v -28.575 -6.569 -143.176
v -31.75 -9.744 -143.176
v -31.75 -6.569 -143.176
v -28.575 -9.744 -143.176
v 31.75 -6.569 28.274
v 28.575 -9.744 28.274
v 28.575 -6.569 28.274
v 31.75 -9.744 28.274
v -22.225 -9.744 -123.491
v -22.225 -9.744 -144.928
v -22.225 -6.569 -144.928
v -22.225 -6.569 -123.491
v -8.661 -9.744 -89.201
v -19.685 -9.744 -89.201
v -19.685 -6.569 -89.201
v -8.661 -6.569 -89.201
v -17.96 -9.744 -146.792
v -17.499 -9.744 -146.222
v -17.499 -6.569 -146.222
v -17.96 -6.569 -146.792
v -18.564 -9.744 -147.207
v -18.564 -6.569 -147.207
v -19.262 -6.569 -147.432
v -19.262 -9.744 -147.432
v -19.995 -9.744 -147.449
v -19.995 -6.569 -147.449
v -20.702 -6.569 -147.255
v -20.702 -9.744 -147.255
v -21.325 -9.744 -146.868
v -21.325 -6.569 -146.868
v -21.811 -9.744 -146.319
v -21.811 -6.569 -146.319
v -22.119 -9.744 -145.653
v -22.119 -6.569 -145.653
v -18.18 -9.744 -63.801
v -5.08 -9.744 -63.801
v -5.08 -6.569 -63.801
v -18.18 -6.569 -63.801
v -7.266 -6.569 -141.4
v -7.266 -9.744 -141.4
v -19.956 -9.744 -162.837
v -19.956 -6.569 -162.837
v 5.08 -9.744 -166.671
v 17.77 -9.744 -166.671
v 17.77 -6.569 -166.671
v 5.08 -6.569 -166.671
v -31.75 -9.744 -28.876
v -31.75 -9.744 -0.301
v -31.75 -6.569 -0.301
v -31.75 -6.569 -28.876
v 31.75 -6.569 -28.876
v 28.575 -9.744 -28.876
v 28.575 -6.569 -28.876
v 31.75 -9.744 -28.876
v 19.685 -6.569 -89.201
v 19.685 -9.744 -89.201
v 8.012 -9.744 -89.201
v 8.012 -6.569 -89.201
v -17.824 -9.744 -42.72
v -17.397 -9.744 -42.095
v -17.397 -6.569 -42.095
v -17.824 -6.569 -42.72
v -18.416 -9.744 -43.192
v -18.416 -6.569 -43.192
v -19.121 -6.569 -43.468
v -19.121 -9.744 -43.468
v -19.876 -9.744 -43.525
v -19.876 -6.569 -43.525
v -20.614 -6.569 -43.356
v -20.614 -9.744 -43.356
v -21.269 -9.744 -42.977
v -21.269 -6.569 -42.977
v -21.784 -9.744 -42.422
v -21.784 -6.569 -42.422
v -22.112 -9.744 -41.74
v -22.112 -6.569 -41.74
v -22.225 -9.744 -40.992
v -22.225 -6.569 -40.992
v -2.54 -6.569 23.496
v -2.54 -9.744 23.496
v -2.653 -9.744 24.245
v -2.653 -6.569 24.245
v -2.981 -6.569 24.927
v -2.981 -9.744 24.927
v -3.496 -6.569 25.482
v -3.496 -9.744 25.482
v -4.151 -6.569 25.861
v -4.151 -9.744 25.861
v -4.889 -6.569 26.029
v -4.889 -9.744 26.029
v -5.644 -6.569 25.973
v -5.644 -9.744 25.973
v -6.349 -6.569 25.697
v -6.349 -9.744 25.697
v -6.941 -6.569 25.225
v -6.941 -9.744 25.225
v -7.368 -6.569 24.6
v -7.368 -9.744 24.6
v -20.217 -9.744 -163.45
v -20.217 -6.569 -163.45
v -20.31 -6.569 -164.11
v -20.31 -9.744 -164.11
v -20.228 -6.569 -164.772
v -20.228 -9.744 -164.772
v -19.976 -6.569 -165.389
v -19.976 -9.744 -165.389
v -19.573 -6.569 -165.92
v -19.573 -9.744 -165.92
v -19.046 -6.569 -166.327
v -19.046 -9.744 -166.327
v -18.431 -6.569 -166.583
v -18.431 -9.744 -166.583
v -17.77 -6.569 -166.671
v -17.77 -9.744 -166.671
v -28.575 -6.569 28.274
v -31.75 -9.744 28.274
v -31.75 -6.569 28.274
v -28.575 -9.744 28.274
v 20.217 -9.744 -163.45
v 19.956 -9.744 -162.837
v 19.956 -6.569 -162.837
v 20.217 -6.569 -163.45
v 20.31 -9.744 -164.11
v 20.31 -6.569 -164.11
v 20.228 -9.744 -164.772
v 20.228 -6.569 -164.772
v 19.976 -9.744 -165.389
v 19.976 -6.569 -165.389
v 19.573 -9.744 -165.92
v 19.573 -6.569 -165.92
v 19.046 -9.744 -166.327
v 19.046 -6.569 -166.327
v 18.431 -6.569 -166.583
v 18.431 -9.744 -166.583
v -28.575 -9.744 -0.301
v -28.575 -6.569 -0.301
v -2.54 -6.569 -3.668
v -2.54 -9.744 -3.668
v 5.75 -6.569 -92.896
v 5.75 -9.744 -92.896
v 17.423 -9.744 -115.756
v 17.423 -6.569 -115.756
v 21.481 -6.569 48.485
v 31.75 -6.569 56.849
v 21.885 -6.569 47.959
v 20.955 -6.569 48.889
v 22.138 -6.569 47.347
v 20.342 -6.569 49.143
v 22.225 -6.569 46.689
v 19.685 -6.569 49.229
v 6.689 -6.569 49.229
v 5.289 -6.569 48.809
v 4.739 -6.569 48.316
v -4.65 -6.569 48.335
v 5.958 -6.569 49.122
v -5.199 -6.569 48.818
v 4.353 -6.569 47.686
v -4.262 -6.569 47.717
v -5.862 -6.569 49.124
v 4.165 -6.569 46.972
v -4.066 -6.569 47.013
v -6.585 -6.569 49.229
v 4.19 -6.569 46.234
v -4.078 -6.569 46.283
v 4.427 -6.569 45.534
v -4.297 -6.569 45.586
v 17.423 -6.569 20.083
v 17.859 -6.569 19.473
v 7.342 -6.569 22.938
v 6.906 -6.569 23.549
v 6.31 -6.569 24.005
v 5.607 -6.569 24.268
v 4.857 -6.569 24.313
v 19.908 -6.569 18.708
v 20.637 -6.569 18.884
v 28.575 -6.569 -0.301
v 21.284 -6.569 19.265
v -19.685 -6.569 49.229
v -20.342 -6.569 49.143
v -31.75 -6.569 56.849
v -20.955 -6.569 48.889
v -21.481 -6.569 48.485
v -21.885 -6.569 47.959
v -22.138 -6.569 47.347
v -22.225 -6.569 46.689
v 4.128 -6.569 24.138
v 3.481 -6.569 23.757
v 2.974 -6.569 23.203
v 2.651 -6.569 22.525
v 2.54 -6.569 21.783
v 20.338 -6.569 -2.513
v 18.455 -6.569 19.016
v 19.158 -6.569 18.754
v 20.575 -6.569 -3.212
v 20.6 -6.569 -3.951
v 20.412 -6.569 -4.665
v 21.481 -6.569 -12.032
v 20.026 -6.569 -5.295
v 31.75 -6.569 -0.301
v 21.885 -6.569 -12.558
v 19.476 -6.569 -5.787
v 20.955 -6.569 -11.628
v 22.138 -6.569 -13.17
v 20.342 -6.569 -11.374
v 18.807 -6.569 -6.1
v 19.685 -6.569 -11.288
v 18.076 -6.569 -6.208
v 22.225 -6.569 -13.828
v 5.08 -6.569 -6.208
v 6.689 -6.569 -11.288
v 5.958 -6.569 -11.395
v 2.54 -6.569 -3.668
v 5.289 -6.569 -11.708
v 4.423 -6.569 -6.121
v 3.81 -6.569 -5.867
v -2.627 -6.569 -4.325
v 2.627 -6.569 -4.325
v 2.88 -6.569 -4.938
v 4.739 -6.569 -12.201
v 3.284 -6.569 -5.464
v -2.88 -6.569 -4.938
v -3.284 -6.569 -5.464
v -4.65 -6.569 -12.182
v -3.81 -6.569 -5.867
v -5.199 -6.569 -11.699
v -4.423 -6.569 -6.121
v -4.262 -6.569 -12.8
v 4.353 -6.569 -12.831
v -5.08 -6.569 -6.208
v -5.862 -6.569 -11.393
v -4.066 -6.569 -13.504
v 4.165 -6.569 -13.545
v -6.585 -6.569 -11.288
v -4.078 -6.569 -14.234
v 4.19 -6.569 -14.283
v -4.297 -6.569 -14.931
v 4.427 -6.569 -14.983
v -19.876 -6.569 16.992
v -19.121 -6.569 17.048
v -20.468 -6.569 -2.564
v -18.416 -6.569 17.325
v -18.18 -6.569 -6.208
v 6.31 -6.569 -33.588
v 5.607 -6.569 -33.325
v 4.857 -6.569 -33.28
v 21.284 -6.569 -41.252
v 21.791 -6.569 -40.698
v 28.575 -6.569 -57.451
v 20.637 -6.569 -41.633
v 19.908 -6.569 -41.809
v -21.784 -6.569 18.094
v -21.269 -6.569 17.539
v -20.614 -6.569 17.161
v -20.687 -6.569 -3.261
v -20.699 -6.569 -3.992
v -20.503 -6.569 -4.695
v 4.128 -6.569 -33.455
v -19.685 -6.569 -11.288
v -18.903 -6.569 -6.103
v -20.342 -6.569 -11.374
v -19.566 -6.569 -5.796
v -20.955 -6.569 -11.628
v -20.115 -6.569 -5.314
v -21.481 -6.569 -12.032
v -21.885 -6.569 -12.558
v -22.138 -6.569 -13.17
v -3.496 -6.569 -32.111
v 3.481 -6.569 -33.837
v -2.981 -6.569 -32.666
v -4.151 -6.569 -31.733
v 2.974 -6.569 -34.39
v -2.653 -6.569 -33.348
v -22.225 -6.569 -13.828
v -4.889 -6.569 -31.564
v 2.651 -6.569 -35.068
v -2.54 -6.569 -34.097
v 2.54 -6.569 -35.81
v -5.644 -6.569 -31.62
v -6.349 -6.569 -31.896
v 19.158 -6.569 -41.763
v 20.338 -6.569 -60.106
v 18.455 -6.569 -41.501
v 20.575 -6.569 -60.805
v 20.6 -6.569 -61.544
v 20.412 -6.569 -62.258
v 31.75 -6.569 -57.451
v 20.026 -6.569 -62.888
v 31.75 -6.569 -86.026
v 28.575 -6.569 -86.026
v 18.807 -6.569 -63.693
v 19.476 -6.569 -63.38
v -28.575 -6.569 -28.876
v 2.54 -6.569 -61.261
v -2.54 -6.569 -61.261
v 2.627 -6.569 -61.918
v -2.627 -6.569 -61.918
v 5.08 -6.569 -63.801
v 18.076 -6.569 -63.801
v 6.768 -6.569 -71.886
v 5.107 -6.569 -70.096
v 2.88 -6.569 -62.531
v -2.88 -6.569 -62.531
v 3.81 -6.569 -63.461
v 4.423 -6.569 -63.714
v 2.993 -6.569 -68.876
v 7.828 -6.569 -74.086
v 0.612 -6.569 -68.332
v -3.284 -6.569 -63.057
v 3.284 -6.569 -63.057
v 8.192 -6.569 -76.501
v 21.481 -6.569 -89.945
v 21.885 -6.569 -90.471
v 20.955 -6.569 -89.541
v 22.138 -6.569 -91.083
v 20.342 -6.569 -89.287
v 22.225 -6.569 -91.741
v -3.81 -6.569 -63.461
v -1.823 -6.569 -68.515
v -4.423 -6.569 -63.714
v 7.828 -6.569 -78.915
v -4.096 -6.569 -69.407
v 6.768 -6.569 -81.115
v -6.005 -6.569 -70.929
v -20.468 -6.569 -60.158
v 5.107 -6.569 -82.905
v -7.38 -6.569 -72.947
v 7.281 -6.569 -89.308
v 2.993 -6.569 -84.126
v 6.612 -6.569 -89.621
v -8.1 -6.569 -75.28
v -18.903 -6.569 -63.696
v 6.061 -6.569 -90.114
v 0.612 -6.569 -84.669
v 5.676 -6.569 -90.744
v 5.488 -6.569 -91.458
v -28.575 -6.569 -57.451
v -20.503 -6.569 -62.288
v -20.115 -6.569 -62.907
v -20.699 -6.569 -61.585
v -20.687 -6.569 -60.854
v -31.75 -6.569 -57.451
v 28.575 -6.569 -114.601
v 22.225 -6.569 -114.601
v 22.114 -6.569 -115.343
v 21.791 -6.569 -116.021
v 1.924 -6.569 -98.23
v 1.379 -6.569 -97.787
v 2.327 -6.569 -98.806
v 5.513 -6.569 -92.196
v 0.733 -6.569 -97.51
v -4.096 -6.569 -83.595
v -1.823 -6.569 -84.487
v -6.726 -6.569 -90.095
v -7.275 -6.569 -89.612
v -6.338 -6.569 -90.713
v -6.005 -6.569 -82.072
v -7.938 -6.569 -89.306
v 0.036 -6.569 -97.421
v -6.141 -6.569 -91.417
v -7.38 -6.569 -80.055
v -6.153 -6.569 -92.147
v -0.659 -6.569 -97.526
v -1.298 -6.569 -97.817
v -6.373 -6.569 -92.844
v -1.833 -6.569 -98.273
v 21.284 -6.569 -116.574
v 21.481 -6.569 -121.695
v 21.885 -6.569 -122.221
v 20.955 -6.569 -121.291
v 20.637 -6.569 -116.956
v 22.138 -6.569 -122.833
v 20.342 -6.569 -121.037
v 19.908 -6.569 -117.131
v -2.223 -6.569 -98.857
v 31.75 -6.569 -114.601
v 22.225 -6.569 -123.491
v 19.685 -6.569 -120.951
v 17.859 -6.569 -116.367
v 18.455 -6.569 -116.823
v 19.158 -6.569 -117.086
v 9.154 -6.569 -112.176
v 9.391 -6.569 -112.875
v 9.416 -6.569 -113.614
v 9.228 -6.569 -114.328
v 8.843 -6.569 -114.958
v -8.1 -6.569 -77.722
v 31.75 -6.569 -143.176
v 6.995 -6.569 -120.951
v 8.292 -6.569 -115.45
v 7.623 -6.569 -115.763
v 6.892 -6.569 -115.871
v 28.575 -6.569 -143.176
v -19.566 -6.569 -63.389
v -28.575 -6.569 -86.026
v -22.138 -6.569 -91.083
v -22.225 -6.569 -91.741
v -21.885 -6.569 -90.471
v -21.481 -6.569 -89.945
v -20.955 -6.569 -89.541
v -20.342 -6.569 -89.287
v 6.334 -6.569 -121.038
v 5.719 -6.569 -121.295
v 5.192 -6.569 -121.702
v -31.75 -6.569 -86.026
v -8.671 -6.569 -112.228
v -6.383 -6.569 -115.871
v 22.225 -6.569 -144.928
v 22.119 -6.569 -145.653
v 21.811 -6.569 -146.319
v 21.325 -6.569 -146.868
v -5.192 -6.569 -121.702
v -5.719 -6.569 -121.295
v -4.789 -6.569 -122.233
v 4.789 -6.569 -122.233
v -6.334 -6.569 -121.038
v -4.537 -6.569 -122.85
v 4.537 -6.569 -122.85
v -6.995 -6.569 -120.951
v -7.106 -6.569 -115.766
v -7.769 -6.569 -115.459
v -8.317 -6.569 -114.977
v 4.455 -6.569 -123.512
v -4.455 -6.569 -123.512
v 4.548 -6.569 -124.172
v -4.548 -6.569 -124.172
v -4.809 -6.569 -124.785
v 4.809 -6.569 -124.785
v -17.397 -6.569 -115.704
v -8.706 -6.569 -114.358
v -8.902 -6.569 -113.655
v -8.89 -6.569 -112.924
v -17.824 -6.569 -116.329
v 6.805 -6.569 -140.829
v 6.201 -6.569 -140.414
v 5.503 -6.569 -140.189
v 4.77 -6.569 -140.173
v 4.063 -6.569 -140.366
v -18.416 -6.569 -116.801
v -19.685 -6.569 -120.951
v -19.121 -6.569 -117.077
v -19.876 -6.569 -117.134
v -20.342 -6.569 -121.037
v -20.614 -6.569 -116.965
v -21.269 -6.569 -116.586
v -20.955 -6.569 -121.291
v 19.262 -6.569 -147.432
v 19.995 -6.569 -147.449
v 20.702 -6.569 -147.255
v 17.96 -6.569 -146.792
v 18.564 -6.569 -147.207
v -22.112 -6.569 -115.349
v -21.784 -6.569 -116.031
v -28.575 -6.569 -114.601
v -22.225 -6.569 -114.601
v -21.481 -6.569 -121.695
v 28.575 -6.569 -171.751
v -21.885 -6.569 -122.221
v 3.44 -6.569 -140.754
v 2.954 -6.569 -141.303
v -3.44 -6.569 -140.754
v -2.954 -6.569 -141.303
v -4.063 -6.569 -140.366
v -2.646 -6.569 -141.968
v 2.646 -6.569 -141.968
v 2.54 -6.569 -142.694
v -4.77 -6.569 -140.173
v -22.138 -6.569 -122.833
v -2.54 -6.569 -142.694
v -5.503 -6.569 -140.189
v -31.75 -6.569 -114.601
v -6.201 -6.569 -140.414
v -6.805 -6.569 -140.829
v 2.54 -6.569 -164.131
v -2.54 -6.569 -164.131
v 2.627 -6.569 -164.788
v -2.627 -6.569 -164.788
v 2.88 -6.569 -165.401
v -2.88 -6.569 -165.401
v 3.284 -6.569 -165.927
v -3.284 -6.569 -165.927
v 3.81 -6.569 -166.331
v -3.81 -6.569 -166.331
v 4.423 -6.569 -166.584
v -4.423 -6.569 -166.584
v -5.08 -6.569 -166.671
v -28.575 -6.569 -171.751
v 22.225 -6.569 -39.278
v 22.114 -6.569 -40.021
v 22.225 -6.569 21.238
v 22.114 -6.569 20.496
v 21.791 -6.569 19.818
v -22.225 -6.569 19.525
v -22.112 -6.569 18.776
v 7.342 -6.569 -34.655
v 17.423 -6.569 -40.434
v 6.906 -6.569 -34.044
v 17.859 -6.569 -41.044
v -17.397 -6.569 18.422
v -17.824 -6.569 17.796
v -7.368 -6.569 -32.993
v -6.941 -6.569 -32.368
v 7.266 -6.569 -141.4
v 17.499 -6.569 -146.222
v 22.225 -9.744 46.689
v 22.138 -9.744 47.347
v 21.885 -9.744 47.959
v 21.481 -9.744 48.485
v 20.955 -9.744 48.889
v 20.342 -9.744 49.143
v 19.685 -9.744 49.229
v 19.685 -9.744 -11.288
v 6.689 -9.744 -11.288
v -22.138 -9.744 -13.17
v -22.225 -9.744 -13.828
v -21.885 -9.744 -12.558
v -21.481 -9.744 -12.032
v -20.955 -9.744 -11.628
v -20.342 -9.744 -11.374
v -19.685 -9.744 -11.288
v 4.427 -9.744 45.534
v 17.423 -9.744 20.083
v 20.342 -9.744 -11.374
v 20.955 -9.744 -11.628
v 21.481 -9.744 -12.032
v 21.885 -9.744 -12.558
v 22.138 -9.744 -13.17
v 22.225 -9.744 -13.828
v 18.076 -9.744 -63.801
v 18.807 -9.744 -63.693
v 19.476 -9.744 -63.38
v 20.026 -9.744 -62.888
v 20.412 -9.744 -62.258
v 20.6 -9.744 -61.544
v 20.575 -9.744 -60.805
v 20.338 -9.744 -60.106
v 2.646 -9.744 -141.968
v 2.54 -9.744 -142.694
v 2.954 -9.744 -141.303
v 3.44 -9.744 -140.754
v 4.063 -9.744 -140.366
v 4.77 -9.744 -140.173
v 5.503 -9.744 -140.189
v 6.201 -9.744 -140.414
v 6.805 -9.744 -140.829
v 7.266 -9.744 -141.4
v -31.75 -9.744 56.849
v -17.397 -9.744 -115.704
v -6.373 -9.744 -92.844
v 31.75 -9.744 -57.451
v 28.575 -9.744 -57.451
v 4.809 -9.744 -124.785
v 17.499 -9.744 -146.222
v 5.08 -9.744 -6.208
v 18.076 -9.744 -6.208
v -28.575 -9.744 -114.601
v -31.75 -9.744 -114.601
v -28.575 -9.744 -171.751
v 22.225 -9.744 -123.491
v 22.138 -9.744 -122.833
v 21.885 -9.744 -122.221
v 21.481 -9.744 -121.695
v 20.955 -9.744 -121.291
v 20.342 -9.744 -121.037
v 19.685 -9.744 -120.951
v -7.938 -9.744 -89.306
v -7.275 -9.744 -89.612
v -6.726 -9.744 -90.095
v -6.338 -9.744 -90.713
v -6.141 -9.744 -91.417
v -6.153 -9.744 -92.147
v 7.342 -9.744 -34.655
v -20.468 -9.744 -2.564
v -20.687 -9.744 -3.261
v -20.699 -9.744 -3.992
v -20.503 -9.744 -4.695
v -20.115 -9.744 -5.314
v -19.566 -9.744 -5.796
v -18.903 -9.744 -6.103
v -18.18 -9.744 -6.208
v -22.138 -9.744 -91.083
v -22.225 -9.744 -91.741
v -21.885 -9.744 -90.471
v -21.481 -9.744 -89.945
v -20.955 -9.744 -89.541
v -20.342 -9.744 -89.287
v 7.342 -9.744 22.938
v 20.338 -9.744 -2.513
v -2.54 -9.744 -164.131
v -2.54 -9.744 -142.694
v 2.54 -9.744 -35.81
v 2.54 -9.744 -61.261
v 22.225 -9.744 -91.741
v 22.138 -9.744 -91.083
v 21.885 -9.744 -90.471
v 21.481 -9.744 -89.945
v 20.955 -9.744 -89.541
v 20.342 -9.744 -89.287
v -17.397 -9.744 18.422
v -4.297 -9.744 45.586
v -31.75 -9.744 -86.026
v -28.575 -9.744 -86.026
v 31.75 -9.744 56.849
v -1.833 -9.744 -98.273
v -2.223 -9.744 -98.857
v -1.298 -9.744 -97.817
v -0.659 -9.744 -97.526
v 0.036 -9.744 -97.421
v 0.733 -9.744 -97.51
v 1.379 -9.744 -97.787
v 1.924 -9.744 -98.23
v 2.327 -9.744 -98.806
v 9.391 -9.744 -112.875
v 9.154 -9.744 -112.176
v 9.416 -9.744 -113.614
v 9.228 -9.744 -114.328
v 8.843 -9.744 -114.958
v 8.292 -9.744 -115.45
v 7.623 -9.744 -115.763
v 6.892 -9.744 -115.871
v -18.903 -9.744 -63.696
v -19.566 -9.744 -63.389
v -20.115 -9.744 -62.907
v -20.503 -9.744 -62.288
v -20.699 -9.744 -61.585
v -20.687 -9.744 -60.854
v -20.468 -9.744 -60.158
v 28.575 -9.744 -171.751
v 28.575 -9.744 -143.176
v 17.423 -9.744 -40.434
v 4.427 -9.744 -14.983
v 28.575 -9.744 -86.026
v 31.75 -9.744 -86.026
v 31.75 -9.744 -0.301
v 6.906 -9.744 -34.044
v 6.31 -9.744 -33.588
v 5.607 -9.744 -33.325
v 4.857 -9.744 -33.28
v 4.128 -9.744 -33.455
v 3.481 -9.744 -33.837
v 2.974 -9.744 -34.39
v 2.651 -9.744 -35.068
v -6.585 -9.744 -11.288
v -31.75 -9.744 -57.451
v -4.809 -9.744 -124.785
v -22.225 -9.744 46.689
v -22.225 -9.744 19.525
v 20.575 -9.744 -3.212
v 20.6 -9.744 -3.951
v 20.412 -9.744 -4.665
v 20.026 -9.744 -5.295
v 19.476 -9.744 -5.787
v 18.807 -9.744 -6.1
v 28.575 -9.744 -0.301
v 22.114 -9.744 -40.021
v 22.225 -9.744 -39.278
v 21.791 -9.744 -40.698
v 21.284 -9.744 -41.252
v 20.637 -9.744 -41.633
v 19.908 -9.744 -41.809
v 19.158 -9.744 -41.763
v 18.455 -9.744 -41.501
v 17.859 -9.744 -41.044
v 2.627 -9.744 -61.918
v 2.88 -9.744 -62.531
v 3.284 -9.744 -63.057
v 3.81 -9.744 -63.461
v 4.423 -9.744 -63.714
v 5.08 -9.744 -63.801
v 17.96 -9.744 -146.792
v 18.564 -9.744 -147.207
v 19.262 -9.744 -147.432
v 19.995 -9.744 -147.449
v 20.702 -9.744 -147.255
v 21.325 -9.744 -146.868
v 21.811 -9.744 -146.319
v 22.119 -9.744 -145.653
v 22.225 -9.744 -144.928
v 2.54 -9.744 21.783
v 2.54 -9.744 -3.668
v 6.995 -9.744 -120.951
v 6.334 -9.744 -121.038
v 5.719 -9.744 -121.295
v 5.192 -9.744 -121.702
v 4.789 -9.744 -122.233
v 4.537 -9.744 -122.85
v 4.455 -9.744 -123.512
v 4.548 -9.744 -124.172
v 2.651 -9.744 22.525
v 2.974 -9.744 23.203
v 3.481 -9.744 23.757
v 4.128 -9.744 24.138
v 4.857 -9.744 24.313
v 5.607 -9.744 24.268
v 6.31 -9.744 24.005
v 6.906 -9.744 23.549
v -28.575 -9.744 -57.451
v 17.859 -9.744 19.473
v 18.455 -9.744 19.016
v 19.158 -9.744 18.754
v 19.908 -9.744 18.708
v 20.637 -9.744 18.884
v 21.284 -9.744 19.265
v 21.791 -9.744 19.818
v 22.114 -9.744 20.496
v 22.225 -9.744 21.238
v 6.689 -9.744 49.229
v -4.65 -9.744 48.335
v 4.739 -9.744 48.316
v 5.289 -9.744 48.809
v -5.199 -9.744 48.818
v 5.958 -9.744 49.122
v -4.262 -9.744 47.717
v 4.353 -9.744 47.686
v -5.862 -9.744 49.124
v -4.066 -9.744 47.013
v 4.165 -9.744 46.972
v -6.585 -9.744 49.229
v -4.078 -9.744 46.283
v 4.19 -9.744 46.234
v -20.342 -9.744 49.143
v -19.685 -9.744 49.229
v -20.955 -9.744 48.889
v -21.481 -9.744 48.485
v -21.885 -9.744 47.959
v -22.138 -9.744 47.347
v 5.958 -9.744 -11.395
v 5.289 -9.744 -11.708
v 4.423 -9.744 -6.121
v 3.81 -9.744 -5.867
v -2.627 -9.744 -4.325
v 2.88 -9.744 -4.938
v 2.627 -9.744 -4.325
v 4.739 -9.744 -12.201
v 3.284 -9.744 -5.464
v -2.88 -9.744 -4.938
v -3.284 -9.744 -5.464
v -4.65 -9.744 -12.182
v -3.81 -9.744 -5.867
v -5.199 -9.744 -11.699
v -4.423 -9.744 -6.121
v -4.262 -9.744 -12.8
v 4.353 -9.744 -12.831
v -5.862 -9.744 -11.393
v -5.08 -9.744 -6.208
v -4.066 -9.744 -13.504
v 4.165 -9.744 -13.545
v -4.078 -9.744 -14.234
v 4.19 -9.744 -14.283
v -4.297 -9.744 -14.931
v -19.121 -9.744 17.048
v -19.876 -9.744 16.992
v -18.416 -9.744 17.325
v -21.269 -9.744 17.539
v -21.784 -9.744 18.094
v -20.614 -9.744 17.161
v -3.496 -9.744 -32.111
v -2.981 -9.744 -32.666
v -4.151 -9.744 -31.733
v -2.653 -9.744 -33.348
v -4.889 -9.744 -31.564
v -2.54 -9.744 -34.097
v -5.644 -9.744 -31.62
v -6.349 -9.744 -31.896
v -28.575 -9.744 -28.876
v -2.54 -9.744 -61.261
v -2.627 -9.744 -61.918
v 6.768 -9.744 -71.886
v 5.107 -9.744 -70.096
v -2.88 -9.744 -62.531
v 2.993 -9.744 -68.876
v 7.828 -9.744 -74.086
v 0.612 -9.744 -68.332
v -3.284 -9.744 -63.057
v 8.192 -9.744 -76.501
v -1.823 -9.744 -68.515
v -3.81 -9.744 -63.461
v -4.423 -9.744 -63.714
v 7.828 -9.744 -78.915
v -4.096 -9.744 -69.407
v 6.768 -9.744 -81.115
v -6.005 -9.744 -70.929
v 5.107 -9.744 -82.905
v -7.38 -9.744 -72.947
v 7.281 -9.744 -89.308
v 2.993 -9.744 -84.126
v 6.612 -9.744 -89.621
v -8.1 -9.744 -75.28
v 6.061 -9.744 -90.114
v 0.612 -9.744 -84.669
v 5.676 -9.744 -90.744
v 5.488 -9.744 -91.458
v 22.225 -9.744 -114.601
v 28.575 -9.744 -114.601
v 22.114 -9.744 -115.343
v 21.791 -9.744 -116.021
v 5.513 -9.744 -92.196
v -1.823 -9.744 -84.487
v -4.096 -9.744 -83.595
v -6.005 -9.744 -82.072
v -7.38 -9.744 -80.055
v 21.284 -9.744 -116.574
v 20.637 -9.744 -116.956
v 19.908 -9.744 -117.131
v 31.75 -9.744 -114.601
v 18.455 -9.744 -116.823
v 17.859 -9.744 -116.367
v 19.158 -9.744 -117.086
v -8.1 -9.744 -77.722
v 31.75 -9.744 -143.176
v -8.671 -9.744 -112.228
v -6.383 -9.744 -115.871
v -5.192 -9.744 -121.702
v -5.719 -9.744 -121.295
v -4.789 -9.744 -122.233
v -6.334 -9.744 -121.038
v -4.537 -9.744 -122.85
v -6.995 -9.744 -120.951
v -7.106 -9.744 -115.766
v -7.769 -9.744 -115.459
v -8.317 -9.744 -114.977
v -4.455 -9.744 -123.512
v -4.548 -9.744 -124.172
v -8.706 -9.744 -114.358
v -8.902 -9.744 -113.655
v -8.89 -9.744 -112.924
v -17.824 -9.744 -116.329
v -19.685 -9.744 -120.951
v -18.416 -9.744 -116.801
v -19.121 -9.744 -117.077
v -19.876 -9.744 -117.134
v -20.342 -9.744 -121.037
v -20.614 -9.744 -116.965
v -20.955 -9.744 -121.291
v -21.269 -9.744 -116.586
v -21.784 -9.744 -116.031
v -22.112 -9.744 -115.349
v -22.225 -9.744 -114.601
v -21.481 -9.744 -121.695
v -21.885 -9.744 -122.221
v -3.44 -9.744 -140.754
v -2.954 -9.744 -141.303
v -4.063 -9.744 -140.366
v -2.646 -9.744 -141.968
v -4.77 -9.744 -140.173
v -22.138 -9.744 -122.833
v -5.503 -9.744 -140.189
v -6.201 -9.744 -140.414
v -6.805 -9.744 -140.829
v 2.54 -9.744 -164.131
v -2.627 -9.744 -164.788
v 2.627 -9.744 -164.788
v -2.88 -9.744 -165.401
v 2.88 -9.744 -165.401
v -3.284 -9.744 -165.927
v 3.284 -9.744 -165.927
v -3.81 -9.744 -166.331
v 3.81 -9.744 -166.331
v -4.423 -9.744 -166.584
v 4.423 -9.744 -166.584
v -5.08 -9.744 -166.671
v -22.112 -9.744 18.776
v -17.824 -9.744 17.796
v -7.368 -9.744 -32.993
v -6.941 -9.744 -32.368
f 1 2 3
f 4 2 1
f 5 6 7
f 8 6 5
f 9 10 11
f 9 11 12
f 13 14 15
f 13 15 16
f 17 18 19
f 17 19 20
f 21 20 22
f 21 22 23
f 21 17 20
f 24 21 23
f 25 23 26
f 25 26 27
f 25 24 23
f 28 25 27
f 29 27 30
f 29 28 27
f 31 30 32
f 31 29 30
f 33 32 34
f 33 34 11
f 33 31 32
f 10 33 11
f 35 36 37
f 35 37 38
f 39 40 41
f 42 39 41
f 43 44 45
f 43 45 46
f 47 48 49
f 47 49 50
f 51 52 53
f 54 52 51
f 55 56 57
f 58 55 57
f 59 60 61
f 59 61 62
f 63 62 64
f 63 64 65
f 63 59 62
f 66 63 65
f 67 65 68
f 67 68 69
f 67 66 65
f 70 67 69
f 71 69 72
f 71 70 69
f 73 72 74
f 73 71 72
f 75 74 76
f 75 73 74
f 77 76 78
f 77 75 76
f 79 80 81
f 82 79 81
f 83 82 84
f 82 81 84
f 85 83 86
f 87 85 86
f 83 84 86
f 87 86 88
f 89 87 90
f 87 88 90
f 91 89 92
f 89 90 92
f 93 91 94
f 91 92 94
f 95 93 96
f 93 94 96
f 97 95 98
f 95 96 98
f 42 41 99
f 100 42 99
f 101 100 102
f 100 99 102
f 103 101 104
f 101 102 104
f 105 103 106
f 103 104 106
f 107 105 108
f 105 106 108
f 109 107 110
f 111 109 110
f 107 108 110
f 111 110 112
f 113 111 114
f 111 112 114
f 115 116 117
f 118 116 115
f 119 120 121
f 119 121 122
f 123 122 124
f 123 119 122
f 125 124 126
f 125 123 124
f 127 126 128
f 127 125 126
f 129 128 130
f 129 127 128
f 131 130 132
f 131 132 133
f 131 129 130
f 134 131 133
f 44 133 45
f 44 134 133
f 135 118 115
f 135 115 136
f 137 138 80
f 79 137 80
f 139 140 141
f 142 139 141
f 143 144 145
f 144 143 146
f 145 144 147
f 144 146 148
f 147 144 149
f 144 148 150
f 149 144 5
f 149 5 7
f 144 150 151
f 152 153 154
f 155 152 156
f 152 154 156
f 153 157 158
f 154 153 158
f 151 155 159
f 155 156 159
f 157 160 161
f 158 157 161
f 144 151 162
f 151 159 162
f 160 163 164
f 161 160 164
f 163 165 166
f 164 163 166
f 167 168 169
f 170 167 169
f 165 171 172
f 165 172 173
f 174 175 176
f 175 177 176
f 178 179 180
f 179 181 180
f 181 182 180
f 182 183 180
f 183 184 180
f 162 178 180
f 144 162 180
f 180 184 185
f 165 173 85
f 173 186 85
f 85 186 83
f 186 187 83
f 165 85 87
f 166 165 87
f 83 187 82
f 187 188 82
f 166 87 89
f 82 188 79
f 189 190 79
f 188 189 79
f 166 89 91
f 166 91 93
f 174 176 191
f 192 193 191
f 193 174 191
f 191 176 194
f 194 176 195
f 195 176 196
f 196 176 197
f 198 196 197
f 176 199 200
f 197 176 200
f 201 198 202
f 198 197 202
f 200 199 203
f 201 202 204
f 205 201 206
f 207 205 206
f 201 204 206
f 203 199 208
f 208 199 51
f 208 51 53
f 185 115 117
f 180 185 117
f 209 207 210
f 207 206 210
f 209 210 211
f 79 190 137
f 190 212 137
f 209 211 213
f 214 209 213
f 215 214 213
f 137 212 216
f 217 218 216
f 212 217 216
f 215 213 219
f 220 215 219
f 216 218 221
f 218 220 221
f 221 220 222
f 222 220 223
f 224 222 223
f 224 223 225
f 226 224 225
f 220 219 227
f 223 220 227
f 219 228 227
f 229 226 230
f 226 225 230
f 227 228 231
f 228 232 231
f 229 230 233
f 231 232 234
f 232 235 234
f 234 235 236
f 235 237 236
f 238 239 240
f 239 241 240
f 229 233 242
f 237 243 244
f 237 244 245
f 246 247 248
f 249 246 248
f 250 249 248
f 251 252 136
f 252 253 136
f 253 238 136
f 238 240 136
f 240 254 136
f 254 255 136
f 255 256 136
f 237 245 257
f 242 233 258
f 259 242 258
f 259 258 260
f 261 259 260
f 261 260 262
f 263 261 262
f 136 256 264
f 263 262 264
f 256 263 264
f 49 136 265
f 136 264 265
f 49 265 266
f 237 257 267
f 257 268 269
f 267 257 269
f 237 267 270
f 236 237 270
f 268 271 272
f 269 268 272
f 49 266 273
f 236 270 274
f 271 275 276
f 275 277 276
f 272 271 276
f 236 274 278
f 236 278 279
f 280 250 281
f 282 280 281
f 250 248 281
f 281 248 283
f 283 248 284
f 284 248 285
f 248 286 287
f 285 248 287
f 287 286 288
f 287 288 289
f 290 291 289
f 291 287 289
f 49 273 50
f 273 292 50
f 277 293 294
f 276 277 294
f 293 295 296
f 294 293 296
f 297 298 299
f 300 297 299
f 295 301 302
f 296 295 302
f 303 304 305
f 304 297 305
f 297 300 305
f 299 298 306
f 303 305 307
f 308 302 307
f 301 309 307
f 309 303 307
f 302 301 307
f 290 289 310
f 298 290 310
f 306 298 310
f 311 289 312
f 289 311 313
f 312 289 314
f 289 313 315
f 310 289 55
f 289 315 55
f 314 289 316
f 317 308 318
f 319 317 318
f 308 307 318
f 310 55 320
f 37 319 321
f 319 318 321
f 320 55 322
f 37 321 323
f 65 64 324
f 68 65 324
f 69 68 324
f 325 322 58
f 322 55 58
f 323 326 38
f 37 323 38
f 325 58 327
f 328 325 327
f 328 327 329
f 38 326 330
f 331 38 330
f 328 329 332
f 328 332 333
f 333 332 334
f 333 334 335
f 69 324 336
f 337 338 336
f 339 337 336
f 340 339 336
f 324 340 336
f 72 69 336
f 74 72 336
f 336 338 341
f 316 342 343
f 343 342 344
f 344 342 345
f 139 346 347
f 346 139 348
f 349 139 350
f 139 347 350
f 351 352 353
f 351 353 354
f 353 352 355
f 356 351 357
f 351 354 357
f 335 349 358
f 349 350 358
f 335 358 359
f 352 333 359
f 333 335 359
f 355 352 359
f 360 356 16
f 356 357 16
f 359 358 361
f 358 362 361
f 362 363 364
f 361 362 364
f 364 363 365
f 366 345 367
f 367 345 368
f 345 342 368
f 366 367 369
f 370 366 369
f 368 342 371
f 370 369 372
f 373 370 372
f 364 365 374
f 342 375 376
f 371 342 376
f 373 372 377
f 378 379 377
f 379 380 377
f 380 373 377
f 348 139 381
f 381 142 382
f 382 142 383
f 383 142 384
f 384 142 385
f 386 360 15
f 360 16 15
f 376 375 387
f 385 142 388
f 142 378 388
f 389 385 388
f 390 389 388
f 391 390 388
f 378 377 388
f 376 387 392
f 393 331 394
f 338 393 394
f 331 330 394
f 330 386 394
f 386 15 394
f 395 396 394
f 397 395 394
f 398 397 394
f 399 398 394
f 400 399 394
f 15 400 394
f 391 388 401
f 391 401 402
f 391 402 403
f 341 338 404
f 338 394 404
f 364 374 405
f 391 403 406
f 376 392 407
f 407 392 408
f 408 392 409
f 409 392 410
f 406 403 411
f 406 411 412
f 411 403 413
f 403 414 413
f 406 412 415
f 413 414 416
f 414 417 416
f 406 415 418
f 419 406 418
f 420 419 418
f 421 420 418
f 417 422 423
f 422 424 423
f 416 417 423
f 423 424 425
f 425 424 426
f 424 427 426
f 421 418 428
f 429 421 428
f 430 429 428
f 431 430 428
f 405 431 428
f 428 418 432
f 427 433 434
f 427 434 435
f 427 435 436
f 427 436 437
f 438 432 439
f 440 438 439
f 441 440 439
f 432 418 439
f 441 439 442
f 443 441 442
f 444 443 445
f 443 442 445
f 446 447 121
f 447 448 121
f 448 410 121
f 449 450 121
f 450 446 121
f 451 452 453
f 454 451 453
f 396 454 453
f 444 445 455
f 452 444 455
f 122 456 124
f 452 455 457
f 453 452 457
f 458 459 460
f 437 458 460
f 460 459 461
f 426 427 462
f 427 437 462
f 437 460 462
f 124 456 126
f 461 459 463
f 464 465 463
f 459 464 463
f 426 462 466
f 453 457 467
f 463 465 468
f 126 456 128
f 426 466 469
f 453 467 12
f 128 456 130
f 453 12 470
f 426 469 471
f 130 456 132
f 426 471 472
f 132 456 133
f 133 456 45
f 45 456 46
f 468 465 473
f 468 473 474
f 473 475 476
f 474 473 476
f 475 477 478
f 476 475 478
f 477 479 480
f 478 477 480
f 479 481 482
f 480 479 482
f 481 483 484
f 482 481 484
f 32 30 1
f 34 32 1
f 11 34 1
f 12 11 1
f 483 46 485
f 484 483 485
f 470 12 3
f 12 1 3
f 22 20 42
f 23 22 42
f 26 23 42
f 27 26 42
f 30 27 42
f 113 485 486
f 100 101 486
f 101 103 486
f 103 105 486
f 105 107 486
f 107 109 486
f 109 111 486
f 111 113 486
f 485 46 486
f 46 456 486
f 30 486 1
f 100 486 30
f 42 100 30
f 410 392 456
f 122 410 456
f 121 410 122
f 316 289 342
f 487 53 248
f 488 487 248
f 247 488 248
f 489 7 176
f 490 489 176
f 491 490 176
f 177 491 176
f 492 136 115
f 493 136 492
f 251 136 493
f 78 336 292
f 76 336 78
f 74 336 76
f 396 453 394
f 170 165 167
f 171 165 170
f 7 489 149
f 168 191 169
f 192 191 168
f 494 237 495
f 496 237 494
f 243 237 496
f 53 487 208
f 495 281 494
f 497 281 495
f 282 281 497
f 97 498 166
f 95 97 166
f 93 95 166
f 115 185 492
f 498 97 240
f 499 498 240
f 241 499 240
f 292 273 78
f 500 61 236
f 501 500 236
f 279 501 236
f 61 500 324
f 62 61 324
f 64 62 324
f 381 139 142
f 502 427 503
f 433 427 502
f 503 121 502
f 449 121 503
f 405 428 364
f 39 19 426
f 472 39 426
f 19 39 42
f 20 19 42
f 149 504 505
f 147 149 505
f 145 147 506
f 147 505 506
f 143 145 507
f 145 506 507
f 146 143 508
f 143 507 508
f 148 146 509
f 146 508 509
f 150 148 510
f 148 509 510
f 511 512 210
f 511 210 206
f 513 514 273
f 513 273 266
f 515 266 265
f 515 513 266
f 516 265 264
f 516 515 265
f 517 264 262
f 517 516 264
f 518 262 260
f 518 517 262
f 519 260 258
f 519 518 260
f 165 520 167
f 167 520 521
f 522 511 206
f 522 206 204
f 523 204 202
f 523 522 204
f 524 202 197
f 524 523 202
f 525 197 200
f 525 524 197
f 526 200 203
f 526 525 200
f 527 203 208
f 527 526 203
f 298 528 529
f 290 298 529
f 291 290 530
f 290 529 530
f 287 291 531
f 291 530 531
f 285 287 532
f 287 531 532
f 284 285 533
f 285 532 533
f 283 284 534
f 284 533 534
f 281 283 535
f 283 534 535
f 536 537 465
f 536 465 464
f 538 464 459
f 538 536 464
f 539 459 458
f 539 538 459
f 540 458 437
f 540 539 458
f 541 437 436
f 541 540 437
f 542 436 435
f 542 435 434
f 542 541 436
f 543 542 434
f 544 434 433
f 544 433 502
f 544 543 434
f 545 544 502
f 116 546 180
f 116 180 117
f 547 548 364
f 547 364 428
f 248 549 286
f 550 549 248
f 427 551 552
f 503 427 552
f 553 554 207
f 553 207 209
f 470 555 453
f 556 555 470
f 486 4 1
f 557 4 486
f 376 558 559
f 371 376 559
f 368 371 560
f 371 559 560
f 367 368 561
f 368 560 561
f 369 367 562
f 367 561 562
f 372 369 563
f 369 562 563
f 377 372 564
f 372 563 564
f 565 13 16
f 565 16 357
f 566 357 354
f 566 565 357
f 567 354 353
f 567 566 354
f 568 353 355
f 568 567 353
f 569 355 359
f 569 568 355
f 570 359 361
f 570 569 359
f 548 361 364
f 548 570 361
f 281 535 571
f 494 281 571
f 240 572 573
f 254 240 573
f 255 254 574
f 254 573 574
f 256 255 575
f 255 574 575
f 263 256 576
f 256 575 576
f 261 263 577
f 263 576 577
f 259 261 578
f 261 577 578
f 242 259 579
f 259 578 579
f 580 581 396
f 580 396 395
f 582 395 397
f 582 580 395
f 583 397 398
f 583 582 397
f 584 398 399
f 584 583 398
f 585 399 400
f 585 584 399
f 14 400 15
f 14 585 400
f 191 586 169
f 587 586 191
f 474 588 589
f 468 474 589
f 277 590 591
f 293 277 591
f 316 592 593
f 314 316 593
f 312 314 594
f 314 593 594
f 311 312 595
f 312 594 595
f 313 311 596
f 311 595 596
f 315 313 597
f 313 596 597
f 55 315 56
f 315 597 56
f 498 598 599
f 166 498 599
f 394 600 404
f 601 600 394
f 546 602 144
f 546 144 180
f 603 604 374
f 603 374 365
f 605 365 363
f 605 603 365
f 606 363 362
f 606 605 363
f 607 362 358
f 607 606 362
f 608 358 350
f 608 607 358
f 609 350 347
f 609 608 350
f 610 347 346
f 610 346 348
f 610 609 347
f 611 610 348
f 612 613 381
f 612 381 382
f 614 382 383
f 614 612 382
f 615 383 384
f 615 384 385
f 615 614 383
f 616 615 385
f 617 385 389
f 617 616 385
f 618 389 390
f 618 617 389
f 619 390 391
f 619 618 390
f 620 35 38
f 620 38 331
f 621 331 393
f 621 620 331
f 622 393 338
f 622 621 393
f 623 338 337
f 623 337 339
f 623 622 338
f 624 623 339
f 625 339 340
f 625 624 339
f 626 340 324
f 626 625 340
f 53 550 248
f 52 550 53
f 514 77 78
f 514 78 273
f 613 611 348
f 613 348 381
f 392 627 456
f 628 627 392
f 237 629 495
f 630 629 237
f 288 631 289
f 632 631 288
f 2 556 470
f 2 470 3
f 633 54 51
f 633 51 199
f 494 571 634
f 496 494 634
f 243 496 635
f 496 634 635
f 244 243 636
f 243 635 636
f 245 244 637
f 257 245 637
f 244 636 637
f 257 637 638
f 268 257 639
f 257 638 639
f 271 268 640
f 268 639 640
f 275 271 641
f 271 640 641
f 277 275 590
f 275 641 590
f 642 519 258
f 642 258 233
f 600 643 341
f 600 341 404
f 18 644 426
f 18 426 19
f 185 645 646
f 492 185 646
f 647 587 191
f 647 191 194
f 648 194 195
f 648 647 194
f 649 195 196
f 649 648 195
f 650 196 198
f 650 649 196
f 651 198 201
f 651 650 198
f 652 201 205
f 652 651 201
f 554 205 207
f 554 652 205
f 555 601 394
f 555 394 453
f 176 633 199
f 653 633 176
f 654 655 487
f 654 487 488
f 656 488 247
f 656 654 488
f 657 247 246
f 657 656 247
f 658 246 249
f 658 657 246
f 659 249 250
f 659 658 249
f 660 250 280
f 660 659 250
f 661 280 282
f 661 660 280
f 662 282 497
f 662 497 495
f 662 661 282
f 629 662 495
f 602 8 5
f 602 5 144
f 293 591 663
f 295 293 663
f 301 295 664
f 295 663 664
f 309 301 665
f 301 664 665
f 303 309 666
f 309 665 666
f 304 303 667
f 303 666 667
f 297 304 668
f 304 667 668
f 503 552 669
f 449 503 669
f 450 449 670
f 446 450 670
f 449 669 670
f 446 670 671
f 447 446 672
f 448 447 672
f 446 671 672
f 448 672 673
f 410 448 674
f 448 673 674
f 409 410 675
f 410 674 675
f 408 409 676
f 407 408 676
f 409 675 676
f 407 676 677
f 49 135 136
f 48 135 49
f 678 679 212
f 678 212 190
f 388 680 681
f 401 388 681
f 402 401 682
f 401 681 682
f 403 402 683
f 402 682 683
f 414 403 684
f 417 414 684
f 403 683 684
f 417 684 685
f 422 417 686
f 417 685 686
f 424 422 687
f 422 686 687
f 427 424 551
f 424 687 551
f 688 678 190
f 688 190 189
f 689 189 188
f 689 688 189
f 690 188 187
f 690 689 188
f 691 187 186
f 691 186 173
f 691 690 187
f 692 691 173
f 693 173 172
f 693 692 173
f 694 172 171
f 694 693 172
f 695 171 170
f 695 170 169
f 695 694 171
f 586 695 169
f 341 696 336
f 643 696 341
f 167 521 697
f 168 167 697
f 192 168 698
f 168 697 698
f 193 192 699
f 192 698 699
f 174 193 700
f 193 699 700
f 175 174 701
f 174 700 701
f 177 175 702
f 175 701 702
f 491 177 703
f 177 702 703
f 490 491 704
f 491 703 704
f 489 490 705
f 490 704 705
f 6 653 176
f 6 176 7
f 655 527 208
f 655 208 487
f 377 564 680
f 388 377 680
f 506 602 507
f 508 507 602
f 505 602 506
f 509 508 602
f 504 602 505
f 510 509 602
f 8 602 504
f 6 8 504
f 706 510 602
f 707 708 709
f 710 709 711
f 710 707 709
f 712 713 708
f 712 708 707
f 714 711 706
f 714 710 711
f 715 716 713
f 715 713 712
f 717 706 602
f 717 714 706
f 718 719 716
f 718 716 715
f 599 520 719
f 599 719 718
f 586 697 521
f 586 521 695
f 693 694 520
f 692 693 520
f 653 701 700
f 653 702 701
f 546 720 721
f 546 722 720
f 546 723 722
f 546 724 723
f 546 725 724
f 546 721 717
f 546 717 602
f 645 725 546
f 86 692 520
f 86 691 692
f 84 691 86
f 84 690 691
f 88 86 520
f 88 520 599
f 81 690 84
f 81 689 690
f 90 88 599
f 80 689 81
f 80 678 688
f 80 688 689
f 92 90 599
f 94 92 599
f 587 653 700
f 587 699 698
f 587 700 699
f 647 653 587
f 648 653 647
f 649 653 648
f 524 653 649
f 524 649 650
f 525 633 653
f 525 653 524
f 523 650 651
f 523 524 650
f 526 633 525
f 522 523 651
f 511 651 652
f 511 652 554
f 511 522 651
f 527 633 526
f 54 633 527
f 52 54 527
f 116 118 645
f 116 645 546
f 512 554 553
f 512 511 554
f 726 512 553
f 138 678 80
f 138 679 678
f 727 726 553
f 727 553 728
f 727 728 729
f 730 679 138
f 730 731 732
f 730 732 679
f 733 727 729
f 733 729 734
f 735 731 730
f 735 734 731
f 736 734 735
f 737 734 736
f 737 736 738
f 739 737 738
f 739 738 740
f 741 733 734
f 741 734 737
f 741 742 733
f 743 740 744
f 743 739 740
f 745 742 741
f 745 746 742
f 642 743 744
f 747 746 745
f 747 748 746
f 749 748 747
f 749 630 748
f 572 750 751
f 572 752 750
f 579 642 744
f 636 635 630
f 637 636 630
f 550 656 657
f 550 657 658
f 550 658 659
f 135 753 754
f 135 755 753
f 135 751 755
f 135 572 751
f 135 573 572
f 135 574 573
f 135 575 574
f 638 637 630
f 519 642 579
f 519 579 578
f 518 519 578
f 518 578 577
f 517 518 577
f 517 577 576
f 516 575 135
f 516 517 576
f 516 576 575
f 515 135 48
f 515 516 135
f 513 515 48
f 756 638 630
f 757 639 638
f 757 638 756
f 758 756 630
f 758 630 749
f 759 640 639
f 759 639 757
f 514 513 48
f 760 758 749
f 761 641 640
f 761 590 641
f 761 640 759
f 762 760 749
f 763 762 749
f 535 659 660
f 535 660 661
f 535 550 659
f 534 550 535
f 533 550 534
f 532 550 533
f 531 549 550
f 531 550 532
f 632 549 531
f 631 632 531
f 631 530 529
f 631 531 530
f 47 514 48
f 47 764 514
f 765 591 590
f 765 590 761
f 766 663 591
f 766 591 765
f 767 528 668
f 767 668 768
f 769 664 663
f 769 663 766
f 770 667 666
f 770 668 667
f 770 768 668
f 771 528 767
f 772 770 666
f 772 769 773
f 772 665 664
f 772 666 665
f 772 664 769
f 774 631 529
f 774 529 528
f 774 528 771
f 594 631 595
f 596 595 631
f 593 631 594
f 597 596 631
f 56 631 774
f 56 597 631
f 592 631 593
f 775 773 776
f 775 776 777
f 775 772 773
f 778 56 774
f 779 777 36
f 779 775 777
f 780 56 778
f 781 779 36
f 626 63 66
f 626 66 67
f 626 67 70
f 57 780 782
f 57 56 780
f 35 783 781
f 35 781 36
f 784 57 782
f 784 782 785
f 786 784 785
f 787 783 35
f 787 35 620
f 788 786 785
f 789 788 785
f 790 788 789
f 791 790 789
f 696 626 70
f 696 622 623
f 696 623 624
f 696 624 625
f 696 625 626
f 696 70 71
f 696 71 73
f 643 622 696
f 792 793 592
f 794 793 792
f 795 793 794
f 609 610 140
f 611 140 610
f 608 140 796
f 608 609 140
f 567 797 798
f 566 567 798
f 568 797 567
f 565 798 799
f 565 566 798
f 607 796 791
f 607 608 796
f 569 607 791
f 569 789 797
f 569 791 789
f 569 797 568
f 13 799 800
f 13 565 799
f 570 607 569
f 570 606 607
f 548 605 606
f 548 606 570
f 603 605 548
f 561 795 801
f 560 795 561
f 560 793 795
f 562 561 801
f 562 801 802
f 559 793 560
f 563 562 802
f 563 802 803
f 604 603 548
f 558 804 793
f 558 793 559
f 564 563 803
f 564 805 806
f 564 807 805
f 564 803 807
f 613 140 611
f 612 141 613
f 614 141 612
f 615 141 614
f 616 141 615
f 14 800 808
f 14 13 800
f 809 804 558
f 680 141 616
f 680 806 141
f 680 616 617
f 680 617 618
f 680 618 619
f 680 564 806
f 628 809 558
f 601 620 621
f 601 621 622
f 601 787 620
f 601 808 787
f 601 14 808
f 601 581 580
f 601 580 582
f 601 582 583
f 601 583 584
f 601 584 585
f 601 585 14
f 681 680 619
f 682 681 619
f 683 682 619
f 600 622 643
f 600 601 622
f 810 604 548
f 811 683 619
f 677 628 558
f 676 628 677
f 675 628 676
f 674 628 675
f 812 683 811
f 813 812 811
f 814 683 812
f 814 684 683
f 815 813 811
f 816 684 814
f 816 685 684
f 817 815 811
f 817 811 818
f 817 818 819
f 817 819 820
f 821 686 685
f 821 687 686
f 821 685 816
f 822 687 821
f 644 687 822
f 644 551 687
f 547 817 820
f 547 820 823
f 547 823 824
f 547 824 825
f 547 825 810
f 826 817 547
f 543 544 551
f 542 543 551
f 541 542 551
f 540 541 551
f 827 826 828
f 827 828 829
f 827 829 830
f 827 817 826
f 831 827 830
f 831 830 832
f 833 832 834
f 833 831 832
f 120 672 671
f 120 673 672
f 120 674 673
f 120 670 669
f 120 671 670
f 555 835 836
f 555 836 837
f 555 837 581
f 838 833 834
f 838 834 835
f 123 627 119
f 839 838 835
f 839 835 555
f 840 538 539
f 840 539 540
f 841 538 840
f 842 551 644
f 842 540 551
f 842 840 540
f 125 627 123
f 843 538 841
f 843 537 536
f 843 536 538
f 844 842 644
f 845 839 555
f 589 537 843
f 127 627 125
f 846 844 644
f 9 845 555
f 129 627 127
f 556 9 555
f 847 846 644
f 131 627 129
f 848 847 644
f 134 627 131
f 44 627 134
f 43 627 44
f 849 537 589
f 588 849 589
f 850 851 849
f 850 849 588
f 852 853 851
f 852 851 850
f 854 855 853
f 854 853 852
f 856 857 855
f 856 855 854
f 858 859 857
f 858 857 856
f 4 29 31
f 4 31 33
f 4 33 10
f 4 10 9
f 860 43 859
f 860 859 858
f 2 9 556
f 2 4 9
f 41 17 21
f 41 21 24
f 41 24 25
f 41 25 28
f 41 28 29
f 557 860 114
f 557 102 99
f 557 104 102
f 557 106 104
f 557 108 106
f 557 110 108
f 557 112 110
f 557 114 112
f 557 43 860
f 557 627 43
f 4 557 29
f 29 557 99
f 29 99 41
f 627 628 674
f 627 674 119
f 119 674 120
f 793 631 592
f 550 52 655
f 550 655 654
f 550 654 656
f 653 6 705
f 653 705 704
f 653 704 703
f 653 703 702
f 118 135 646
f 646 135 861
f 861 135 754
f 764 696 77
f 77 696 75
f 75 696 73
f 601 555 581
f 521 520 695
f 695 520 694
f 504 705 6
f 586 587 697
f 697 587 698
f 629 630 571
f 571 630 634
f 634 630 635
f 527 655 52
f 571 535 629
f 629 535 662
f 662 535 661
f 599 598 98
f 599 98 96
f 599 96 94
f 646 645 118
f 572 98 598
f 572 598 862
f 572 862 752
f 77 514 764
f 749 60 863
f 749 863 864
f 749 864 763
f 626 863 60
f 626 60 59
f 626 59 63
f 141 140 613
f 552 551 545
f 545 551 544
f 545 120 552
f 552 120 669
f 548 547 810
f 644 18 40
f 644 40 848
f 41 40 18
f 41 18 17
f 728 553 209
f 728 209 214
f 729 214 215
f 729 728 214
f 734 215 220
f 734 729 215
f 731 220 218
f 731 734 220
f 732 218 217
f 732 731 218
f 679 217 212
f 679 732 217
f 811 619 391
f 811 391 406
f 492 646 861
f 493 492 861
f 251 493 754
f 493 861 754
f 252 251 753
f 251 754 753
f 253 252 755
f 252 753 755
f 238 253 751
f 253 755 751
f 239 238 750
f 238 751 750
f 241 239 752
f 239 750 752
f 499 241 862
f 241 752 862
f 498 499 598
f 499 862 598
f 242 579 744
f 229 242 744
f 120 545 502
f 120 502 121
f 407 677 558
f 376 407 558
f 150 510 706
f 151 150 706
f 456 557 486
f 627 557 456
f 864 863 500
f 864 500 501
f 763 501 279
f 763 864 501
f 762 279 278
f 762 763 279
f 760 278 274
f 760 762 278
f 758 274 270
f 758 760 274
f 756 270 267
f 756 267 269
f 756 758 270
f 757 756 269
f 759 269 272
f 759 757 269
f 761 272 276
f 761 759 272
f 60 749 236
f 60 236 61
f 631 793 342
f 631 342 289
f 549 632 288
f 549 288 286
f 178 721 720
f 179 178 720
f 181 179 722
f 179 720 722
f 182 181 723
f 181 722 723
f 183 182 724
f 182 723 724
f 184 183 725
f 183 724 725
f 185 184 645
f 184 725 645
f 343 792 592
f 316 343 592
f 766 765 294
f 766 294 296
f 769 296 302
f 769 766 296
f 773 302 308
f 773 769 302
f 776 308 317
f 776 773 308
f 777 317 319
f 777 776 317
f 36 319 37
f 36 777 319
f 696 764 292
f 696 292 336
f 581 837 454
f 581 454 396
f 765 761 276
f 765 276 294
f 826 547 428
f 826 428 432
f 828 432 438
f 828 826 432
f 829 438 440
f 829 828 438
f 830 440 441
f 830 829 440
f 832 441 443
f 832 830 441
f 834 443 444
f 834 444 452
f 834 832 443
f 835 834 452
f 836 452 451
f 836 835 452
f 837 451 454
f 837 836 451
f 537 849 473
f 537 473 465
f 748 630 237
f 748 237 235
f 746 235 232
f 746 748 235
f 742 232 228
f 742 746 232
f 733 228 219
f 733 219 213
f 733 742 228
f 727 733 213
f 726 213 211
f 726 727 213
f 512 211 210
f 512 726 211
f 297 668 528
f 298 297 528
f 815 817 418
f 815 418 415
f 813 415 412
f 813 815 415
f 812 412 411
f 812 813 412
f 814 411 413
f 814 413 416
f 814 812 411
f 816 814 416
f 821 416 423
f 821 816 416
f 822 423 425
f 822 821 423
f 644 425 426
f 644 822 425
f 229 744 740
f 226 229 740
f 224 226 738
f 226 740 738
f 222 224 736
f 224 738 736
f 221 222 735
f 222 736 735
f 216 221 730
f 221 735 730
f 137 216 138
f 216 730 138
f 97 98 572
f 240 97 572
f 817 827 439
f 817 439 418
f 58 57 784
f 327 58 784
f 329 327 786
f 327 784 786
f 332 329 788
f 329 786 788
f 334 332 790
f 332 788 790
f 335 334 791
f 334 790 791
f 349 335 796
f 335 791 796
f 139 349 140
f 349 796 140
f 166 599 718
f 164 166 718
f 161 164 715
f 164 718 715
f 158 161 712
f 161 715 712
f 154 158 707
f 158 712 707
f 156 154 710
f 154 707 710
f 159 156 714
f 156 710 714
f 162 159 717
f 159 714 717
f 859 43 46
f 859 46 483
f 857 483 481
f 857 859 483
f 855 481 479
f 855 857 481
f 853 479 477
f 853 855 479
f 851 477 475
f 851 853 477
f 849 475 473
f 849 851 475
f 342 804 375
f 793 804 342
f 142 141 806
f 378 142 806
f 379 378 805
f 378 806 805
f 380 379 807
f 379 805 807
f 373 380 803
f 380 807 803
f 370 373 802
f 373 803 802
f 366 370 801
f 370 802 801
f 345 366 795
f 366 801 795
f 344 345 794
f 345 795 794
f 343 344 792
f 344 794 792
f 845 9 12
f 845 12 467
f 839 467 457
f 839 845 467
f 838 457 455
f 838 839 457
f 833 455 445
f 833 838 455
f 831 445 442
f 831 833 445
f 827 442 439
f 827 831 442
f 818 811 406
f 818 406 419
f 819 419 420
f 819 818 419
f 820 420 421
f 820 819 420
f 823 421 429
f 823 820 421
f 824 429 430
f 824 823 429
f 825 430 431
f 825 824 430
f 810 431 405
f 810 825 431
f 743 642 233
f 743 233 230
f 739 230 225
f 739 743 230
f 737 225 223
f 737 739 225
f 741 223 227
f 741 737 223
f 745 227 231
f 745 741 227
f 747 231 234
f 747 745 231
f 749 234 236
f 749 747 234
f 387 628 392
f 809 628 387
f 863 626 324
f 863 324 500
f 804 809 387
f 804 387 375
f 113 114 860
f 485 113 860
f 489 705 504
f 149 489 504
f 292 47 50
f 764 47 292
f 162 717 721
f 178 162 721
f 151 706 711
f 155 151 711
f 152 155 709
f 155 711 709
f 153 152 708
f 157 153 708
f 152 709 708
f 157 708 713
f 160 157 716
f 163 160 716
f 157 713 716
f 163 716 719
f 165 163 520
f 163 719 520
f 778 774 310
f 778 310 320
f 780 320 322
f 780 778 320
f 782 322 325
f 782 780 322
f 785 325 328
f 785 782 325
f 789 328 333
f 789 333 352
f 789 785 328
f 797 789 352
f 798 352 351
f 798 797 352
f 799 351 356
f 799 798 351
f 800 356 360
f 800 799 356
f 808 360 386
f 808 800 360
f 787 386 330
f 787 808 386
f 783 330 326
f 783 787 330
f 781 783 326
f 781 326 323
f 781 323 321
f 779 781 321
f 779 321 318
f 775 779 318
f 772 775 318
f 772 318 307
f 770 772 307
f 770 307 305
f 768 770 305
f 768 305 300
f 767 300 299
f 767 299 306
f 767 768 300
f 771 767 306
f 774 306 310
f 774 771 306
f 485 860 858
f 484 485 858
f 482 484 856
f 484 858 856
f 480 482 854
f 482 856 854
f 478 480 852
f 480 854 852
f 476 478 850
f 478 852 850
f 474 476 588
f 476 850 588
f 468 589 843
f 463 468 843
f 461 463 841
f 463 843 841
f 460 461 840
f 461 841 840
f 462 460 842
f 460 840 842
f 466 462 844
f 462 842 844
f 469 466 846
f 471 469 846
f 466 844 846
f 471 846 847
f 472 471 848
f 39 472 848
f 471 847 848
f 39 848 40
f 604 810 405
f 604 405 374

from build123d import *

# Parameters (mm, degrees)
SKETCH1_R           = 8.1915
BOSS_EXTRUDE1_DEPTH = 3.175


with BuildPart() as part:
    # Sketch1 → Boss-Extrude1 (new body)
    with BuildSketch(Plane(origin=(0, -9.743731804, 0), x_dir=(1, 0, 0), z_dir=(0, 1, 0))):
        Polygon((-31.75, 143.175862399), (-28.575, 143.175862399), (-28.575, 171.750862399), (28.575, 171.750862399), (28.575, 143.175862399), (31.75, 143.175862399), (31.75, 114.600862399), (28.575, 114.600862399), (28.575, 86.025862399), (31.75, 86.025862399), (31.75, 57.450862399), (28.575, 57.450862399), (28.575, 28.875862399), (31.75, 28.875862399), (31.75, 0.300862399), (28.575, 0.300862399), (28.575, -28.274137601), (31.75, -28.274137601), (31.75, -56.849137601), (-31.75, -56.849137601), (-31.75, -28.274137601), (-28.575, -28.274137601), (-28.575, 0.300862399), (-31.75, 0.300862399), (-31.75, 28.875862399), (-28.575, 28.875862399), (-28.575, 57.450862399), (-31.75, 57.450862399), (-31.75, 86.025862399), (-28.575, 86.025862399), (-28.575, 114.600862399), (-31.75, 114.600862399), align=None)
        with Locations((0, 76.500862399)):
            Circle(SKETCH1_R, mode=Mode.SUBTRACT)
        with BuildLine():
            Line((-17.769774531, 166.670862399), (-5.08, 166.670862399))
            ThreePointArc((-5.08, 166.670862399), (-3.283948776, 165.926913623), (-2.54, 164.130862399))
            Line((-2.54, 164.130862399), (-2.54, 142.693779868))
            ThreePointArc((-2.54, 142.693779868), (-4.409257974, 140.243942091), (-7.265752074, 141.399914392))
            Line((-7.265752074, 141.399914392), (-19.955526605, 162.836996923))
            ThreePointArc((-19.955526605, 162.836996923), (-19.976357671, 165.388873069), (-17.769774531, 166.670862399))
        make_face(mode=Mode.SUBTRACT)
        with BuildLine():
            Line((2.54, 164.130862399), (2.54, 142.693779868))
            ThreePointArc((2.54, 142.693779868), (4.409257974, 140.243942091), (7.265752074, 141.399914392))
            Line((7.265752074, 141.399914392), (19.955526605, 162.836996923))
            ThreePointArc((19.955526605, 162.836996923), (19.976357671, 165.388873069), (17.769774531, 166.670862399))
            Line((17.769774531, 166.670862399), (5.08, 166.670862399))
            ThreePointArc((5.08, 166.670862399), (3.283948776, 165.926913623), (2.54, 164.130862399))
        make_face(mode=Mode.SUBTRACT)
        with BuildLine():
            Line((-22.225, 144.92794493), (-22.225, 123.490862399))
            ThreePointArc((-22.225, 123.490862399), (-21.481051224, 121.694811175), (-19.685, 120.950862399))
            Line((-19.685, 120.950862399), (-6.995225469, 120.950862399))
            ThreePointArc((-6.995225469, 120.950862399), (-4.788642329, 122.232851729), (-4.809473395, 124.784727875))
            Line((-4.809473395, 124.784727875), (-17.499247926, 146.221810406))
            ThreePointArc((-17.499247926, 146.221810406), (-20.355742026, 147.377782707), (-22.225, 144.92794493))
        make_face(mode=Mode.SUBTRACT)
        with BuildLine():
            Line((4.809473395, 124.784727875), (17.499247926, 146.221810406))
            ThreePointArc((17.499247926, 146.221810406), (20.355742026, 147.377782707), (22.225, 144.92794493))
            Line((22.225, 144.92794493), (22.225, 123.490862399))
            ThreePointArc((22.225, 123.490862399), (21.481051224, 121.694811175), (19.685, 120.950862399))
            Line((19.685, 120.950862399), (6.995225469, 120.950862399))
            ThreePointArc((6.995225469, 120.950862399), (4.788642329, 122.232851729), (4.809473395, 124.784727875))
        make_face(mode=Mode.SUBTRACT)
        with BuildLine():
            Line((5.749780192, 92.89598746), (17.422858074, 115.75598746))
            ThreePointArc((17.422858074, 115.75598746), (20.279036829, 117.070421114), (22.225, 114.600862399))
            Line((22.225, 114.600862399), (22.225, 91.740862399))
            ThreePointArc((22.225, 91.740862399), (21.481051224, 89.944811175), (19.685, 89.200862399))
            Line((19.685, 89.200862399), (8.011922118, 89.200862399))
            ThreePointArc((8.011922118, 89.200862399), (5.845632934, 90.414668155), (5.749780192, 92.89598746))
        make_face(mode=Mode.SUBTRACT)
        with BuildLine():
            Line((-6.372736394, 92.844195759), (-17.397150465, 115.704195759))
            ThreePointArc((-17.397150465, 115.704195759), (-20.250889645, 117.077022513), (-22.225, 114.600862399))
            Line((-22.225, 114.600862399), (-22.225, 91.740862399))
            ThreePointArc((-22.225, 91.740862399), (-21.481051224, 89.944811175), (-19.685, 89.200862399))
            Line((-19.685, 89.200862399), (-8.66058593, 89.200862399))
            ThreePointArc((-8.66058593, 89.200862399), (-6.509531917, 90.390097196), (-6.372736394, 92.844195759))
        make_face(mode=Mode.SUBTRACT)
        with BuildLine():
            Line((5.08, 63.800862399), (18.076004066, 63.800862399))
            ThreePointArc((18.076004066, 63.800862399), (20.24229325, 62.587056643), (20.338145992, 60.105737338))
            Line((20.338145992, 60.105737338), (7.342141926, 34.654981681))
            ThreePointArc((7.342141926, 34.654981681), (4.485963171, 33.340548027), (2.54, 35.810106741))
            Line((2.54, 35.810106741), (2.54, 61.260862399))
            ThreePointArc((2.54, 61.260862399), (3.283948776, 63.056913623), (5.08, 63.800862399))
        make_face(mode=Mode.SUBTRACT)
        with BuildLine():
            Line((-5.08, 63.800862399), (-18.180124412, 63.800862399))
            ThreePointArc((-18.180124412, 63.800862399), (-20.331178425, 62.611627602), (-20.467973948, 60.157529039))
            Line((-20.467973948, 60.157529039), (-7.367849535, 32.993378441))
            ThreePointArc((-7.367849535, 32.993378441), (-4.514110355, 31.620551687), (-2.54, 34.096711801))
            Line((-2.54, 34.096711801), (-2.54, 61.260862399))
            ThreePointArc((-2.54, 61.260862399), (-3.283948776, 63.056913623), (-5.08, 63.800862399))
        make_face(mode=Mode.SUBTRACT)
        with BuildLine():
            Line((17.422858074, 40.433585982), (4.426854008, 14.982830325))
            ThreePointArc((4.426854008, 14.982830325), (4.52270675, 12.50151102), (6.688995934, 11.287705264))
            Line((6.688995934, 11.287705264), (19.685, 11.287705264))
            ThreePointArc((19.685, 11.287705264), (21.481051224, 12.03165404), (22.225, 13.827705264))
            Line((22.225, 13.827705264), (22.225, 39.278460922))
            ThreePointArc((22.225, 39.278460922), (20.279036829, 41.748019636), (17.422858074, 40.433585982))
        make_face(mode=Mode.SUBTRACT)
        with BuildLine():
            Line((-22.225, 40.991855862), (-22.225, 13.827705264))
            ThreePointArc((-22.225, 13.827705264), (-21.481051224, 12.03165404), (-19.685, 11.287705264))
            Line((-19.685, 11.287705264), (-6.584875588, 11.287705264))
            ThreePointArc((-6.584875588, 11.287705264), (-4.433821575, 12.476940061), (-4.297026052, 14.931038624))
            Line((-4.297026052, 14.931038624), (-17.397150465, 42.095189222))
            ThreePointArc((-17.397150465, 42.095189222), (-20.250889645, 43.468015976), (-22.225, 40.991855862))
        make_face(mode=Mode.SUBTRACT)
        with BuildLine():
            Line((-18.180124412, 6.207705264), (-5.08, 6.207705264))
            ThreePointArc((-5.08, 6.207705264), (-3.283948776, 5.463756488), (-2.54, 3.667705264))
            Line((-2.54, 3.667705264), (-2.54, -23.496445334))
            ThreePointArc((-2.54, -23.496445334), (-4.514110355, -25.972605448), (-7.367849535, -24.599778694))
            Line((-7.367849535, -24.599778694), (-20.467973948, 2.564371904))
            ThreePointArc((-20.467973948, 2.564371904), (-20.331178425, 5.018470467), (-18.180124412, 6.207705264))
        make_face(mode=Mode.SUBTRACT)
        with BuildLine():
            Line((2.54, 3.667705264), (2.54, -21.783050394))
            ThreePointArc((2.54, -21.783050394), (4.485963171, -24.252609108), (7.342141926, -22.938175454))
            Line((7.342141926, -22.938175454), (20.338145992, 2.512580203))
            ThreePointArc((20.338145992, 2.512580203), (20.24229325, 4.993899508), (18.076004066, 6.207705264))
            Line((18.076004066, 6.207705264), (5.08, 6.207705264))
            ThreePointArc((5.08, 6.207705264), (3.283948776, 5.463756488), (2.54, 3.667705264))
        make_face(mode=Mode.SUBTRACT)
        with BuildLine():
            Line((4.426854008, -45.53401254), (17.422858074, -20.083256883))
            ThreePointArc((17.422858074, -20.083256883), (20.279036829, -18.768823229), (22.225, -21.238381943))
            Line((22.225, -21.238381943), (22.225, -46.689137601))
            ThreePointArc((22.225, -46.689137601), (21.481051224, -48.485188825), (19.685, -49.229137601))
            Line((19.685, -49.229137601), (6.688995934, -49.229137601))
            ThreePointArc((6.688995934, -49.229137601), (4.52270675, -48.015331845), (4.426854008, -45.53401254))
        make_face(mode=Mode.SUBTRACT)
        with BuildLine():
            Line((-17.397150465, -18.421653643), (-4.297026052, -45.585804241))
            ThreePointArc((-4.297026052, -45.585804241), (-4.433821575, -48.039902804), (-6.584875588, -49.229137601))
            Line((-6.584875588, -49.229137601), (-19.685, -49.229137601))
            ThreePointArc((-19.685, -49.229137601), (-21.481051224, -48.485188825), (-22.225, -46.689137601))
            Line((-22.225, -46.689137601), (-22.225, -19.524987003))
            ThreePointArc((-22.225, -19.524987003), (-20.250889645, -17.048826889), (-17.397150465, -18.421653643))
        make_face(mode=Mode.SUBTRACT)
        with BuildLine():
            Line((6.89223147, 115.870862399), (-6.382799442, 115.870862399))
            ThreePointArc((-6.382799442, 115.870862399), (-8.533853455, 114.681627602), (-8.670648977, 112.227529039))
            Line((-8.670648977, 112.227529039), (-2.222824791, 98.857452412))
            ThreePointArc((-2.222824791, 98.857452412), (0.036114273, 97.420950308), (2.32716667, 98.805660711))
            Line((2.32716667, 98.805660711), (9.154373397, 112.175737338))
            ThreePointArc((9.154373397, 112.175737338), (9.058520654, 114.657056643), (6.89223147, 115.870862399))
        make_face(mode=Mode.SUBTRACT)
    extrude(amount=BOSS_EXTRUDE1_DEPTH)


solid = part.part
